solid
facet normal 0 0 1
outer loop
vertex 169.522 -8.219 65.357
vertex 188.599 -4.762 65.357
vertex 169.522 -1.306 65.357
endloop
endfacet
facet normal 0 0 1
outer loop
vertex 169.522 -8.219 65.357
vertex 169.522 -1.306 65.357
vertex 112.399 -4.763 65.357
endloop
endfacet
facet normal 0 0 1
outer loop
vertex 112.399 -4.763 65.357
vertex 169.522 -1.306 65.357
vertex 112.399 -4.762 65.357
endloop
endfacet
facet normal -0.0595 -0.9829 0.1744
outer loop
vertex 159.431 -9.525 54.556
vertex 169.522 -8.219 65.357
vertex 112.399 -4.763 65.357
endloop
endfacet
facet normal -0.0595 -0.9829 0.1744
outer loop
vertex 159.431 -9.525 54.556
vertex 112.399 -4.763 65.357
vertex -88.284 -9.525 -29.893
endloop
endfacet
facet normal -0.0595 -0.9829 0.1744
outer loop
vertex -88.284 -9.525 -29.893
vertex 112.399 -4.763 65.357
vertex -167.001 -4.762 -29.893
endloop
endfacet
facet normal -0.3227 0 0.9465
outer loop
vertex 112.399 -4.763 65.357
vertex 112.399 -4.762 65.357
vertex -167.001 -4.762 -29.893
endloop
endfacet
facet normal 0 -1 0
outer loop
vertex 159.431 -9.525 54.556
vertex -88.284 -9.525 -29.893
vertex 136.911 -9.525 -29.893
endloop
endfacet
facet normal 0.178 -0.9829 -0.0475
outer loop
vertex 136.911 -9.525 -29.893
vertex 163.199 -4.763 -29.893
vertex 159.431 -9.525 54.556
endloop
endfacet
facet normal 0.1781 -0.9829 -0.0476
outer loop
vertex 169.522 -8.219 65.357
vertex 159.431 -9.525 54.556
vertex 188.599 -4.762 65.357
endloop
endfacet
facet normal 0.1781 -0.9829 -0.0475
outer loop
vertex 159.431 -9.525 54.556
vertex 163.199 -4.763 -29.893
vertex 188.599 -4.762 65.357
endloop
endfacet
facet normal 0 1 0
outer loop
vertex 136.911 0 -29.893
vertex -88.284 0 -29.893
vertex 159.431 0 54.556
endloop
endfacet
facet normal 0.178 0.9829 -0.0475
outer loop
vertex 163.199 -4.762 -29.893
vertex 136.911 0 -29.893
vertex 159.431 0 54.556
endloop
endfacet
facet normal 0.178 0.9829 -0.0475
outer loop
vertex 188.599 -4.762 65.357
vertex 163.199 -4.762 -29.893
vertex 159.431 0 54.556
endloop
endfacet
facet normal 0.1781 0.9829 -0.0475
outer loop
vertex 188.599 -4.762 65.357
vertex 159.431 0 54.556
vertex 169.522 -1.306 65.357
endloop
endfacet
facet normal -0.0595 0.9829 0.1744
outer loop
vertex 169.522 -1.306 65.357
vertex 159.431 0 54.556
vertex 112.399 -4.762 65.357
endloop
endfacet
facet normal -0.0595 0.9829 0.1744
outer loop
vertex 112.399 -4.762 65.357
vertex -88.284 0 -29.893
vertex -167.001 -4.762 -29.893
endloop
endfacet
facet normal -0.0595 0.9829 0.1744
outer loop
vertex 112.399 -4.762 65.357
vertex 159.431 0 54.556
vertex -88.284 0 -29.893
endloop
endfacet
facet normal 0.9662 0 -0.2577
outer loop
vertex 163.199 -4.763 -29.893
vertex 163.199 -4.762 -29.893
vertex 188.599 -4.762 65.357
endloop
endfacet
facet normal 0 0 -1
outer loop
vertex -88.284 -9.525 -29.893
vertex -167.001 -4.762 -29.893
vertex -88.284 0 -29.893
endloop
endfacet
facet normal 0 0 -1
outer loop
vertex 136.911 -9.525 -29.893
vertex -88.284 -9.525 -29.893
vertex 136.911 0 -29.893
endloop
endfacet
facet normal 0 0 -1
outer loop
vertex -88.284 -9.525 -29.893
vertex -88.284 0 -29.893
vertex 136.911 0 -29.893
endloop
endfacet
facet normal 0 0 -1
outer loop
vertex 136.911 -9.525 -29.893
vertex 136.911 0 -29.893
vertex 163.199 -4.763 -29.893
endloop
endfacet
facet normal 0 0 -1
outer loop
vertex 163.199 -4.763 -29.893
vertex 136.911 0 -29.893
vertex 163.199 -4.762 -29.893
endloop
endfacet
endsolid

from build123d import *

# Parameters (mm, degrees)
F1_DEPTH = 9.525
F2_SIZE2 = 4.7625
F2_SIZE  = 25.4
F3_SIZE2 = 25.39999
F3_SIZE  = 4.76249
F4_SIZE2 = 4.7625
F4_SIZE  = 25.4
F5_SIZE2 = 25.39999
F5_SIZE  = 4.76249


# Not quite as in the source:
# - a fillet or chamfer is up to 0.001 mm smaller than in the source, because OpenCascade refuses the exact size


with BuildPart() as f1:
    # F0 (on Front) → F1 (new body)
    with BuildSketch(Plane.XZ):
        Polygon((112.3986273699, 65.3573278389), (-167.0013726301, -29.8926721611), (163.1986273699, -29.8926721611), (188.5986273699, 65.3573278389), align=None)
    extrude(amount=F1_DEPTH)

    # F2
    f2_edges = [f1.edges().sort_by_distance(p)[0] for p in [
        (-27.301373, -9.525, 17.732328),
    ]]
    f2_side = f1.faces().sort_by_distance((58.423627, -9.525, 7.810453))[0]
    chamfer(f2_edges, length=F2_SIZE, length2=F2_SIZE2, reference=f2_side)

    # F3 (size 4.7625 and 25.4 in the source; OpenCascade refuses exactly that, so slightly less here)
    f3_edges = [f1.edges().sort_by_distance(p)[0] for p in [
        (-27.301373, 0, 17.732328),
    ]]
    f3_side = f1.faces().sort_by_distance((-27.301373, -2.38125, 17.732328))[0]
    chamfer(f3_edges, length=F3_SIZE, length2=F3_SIZE2, reference=f3_side)

    # F4
    f4_edges = [f1.edges().sort_by_distance(p)[0] for p in [
        (175.772766, -9.525, 17.260346),
    ]]
    f4_side = f1.faces().sort_by_distance((87.753798, -9.525, 1.542673))[0]
    chamfer(f4_edges, length=F4_SIZE, length2=F4_SIZE2, reference=f4_side)

    # F5 (size 4.7625 and 25.4 in the source; OpenCascade refuses exactly that, so slightly less here)
    f5_edges = [f1.edges().sort_by_distance(p)[0] for p in [
        (175.772767, 0, 17.260352),
    ]]
    f5_side = f1.faces().sort_by_distance((175.896628, -2.381619, 17.72483))[0]
    chamfer(f5_edges, length=F5_SIZE, length2=F5_SIZE2, reference=f5_side)


solid = f1.part
